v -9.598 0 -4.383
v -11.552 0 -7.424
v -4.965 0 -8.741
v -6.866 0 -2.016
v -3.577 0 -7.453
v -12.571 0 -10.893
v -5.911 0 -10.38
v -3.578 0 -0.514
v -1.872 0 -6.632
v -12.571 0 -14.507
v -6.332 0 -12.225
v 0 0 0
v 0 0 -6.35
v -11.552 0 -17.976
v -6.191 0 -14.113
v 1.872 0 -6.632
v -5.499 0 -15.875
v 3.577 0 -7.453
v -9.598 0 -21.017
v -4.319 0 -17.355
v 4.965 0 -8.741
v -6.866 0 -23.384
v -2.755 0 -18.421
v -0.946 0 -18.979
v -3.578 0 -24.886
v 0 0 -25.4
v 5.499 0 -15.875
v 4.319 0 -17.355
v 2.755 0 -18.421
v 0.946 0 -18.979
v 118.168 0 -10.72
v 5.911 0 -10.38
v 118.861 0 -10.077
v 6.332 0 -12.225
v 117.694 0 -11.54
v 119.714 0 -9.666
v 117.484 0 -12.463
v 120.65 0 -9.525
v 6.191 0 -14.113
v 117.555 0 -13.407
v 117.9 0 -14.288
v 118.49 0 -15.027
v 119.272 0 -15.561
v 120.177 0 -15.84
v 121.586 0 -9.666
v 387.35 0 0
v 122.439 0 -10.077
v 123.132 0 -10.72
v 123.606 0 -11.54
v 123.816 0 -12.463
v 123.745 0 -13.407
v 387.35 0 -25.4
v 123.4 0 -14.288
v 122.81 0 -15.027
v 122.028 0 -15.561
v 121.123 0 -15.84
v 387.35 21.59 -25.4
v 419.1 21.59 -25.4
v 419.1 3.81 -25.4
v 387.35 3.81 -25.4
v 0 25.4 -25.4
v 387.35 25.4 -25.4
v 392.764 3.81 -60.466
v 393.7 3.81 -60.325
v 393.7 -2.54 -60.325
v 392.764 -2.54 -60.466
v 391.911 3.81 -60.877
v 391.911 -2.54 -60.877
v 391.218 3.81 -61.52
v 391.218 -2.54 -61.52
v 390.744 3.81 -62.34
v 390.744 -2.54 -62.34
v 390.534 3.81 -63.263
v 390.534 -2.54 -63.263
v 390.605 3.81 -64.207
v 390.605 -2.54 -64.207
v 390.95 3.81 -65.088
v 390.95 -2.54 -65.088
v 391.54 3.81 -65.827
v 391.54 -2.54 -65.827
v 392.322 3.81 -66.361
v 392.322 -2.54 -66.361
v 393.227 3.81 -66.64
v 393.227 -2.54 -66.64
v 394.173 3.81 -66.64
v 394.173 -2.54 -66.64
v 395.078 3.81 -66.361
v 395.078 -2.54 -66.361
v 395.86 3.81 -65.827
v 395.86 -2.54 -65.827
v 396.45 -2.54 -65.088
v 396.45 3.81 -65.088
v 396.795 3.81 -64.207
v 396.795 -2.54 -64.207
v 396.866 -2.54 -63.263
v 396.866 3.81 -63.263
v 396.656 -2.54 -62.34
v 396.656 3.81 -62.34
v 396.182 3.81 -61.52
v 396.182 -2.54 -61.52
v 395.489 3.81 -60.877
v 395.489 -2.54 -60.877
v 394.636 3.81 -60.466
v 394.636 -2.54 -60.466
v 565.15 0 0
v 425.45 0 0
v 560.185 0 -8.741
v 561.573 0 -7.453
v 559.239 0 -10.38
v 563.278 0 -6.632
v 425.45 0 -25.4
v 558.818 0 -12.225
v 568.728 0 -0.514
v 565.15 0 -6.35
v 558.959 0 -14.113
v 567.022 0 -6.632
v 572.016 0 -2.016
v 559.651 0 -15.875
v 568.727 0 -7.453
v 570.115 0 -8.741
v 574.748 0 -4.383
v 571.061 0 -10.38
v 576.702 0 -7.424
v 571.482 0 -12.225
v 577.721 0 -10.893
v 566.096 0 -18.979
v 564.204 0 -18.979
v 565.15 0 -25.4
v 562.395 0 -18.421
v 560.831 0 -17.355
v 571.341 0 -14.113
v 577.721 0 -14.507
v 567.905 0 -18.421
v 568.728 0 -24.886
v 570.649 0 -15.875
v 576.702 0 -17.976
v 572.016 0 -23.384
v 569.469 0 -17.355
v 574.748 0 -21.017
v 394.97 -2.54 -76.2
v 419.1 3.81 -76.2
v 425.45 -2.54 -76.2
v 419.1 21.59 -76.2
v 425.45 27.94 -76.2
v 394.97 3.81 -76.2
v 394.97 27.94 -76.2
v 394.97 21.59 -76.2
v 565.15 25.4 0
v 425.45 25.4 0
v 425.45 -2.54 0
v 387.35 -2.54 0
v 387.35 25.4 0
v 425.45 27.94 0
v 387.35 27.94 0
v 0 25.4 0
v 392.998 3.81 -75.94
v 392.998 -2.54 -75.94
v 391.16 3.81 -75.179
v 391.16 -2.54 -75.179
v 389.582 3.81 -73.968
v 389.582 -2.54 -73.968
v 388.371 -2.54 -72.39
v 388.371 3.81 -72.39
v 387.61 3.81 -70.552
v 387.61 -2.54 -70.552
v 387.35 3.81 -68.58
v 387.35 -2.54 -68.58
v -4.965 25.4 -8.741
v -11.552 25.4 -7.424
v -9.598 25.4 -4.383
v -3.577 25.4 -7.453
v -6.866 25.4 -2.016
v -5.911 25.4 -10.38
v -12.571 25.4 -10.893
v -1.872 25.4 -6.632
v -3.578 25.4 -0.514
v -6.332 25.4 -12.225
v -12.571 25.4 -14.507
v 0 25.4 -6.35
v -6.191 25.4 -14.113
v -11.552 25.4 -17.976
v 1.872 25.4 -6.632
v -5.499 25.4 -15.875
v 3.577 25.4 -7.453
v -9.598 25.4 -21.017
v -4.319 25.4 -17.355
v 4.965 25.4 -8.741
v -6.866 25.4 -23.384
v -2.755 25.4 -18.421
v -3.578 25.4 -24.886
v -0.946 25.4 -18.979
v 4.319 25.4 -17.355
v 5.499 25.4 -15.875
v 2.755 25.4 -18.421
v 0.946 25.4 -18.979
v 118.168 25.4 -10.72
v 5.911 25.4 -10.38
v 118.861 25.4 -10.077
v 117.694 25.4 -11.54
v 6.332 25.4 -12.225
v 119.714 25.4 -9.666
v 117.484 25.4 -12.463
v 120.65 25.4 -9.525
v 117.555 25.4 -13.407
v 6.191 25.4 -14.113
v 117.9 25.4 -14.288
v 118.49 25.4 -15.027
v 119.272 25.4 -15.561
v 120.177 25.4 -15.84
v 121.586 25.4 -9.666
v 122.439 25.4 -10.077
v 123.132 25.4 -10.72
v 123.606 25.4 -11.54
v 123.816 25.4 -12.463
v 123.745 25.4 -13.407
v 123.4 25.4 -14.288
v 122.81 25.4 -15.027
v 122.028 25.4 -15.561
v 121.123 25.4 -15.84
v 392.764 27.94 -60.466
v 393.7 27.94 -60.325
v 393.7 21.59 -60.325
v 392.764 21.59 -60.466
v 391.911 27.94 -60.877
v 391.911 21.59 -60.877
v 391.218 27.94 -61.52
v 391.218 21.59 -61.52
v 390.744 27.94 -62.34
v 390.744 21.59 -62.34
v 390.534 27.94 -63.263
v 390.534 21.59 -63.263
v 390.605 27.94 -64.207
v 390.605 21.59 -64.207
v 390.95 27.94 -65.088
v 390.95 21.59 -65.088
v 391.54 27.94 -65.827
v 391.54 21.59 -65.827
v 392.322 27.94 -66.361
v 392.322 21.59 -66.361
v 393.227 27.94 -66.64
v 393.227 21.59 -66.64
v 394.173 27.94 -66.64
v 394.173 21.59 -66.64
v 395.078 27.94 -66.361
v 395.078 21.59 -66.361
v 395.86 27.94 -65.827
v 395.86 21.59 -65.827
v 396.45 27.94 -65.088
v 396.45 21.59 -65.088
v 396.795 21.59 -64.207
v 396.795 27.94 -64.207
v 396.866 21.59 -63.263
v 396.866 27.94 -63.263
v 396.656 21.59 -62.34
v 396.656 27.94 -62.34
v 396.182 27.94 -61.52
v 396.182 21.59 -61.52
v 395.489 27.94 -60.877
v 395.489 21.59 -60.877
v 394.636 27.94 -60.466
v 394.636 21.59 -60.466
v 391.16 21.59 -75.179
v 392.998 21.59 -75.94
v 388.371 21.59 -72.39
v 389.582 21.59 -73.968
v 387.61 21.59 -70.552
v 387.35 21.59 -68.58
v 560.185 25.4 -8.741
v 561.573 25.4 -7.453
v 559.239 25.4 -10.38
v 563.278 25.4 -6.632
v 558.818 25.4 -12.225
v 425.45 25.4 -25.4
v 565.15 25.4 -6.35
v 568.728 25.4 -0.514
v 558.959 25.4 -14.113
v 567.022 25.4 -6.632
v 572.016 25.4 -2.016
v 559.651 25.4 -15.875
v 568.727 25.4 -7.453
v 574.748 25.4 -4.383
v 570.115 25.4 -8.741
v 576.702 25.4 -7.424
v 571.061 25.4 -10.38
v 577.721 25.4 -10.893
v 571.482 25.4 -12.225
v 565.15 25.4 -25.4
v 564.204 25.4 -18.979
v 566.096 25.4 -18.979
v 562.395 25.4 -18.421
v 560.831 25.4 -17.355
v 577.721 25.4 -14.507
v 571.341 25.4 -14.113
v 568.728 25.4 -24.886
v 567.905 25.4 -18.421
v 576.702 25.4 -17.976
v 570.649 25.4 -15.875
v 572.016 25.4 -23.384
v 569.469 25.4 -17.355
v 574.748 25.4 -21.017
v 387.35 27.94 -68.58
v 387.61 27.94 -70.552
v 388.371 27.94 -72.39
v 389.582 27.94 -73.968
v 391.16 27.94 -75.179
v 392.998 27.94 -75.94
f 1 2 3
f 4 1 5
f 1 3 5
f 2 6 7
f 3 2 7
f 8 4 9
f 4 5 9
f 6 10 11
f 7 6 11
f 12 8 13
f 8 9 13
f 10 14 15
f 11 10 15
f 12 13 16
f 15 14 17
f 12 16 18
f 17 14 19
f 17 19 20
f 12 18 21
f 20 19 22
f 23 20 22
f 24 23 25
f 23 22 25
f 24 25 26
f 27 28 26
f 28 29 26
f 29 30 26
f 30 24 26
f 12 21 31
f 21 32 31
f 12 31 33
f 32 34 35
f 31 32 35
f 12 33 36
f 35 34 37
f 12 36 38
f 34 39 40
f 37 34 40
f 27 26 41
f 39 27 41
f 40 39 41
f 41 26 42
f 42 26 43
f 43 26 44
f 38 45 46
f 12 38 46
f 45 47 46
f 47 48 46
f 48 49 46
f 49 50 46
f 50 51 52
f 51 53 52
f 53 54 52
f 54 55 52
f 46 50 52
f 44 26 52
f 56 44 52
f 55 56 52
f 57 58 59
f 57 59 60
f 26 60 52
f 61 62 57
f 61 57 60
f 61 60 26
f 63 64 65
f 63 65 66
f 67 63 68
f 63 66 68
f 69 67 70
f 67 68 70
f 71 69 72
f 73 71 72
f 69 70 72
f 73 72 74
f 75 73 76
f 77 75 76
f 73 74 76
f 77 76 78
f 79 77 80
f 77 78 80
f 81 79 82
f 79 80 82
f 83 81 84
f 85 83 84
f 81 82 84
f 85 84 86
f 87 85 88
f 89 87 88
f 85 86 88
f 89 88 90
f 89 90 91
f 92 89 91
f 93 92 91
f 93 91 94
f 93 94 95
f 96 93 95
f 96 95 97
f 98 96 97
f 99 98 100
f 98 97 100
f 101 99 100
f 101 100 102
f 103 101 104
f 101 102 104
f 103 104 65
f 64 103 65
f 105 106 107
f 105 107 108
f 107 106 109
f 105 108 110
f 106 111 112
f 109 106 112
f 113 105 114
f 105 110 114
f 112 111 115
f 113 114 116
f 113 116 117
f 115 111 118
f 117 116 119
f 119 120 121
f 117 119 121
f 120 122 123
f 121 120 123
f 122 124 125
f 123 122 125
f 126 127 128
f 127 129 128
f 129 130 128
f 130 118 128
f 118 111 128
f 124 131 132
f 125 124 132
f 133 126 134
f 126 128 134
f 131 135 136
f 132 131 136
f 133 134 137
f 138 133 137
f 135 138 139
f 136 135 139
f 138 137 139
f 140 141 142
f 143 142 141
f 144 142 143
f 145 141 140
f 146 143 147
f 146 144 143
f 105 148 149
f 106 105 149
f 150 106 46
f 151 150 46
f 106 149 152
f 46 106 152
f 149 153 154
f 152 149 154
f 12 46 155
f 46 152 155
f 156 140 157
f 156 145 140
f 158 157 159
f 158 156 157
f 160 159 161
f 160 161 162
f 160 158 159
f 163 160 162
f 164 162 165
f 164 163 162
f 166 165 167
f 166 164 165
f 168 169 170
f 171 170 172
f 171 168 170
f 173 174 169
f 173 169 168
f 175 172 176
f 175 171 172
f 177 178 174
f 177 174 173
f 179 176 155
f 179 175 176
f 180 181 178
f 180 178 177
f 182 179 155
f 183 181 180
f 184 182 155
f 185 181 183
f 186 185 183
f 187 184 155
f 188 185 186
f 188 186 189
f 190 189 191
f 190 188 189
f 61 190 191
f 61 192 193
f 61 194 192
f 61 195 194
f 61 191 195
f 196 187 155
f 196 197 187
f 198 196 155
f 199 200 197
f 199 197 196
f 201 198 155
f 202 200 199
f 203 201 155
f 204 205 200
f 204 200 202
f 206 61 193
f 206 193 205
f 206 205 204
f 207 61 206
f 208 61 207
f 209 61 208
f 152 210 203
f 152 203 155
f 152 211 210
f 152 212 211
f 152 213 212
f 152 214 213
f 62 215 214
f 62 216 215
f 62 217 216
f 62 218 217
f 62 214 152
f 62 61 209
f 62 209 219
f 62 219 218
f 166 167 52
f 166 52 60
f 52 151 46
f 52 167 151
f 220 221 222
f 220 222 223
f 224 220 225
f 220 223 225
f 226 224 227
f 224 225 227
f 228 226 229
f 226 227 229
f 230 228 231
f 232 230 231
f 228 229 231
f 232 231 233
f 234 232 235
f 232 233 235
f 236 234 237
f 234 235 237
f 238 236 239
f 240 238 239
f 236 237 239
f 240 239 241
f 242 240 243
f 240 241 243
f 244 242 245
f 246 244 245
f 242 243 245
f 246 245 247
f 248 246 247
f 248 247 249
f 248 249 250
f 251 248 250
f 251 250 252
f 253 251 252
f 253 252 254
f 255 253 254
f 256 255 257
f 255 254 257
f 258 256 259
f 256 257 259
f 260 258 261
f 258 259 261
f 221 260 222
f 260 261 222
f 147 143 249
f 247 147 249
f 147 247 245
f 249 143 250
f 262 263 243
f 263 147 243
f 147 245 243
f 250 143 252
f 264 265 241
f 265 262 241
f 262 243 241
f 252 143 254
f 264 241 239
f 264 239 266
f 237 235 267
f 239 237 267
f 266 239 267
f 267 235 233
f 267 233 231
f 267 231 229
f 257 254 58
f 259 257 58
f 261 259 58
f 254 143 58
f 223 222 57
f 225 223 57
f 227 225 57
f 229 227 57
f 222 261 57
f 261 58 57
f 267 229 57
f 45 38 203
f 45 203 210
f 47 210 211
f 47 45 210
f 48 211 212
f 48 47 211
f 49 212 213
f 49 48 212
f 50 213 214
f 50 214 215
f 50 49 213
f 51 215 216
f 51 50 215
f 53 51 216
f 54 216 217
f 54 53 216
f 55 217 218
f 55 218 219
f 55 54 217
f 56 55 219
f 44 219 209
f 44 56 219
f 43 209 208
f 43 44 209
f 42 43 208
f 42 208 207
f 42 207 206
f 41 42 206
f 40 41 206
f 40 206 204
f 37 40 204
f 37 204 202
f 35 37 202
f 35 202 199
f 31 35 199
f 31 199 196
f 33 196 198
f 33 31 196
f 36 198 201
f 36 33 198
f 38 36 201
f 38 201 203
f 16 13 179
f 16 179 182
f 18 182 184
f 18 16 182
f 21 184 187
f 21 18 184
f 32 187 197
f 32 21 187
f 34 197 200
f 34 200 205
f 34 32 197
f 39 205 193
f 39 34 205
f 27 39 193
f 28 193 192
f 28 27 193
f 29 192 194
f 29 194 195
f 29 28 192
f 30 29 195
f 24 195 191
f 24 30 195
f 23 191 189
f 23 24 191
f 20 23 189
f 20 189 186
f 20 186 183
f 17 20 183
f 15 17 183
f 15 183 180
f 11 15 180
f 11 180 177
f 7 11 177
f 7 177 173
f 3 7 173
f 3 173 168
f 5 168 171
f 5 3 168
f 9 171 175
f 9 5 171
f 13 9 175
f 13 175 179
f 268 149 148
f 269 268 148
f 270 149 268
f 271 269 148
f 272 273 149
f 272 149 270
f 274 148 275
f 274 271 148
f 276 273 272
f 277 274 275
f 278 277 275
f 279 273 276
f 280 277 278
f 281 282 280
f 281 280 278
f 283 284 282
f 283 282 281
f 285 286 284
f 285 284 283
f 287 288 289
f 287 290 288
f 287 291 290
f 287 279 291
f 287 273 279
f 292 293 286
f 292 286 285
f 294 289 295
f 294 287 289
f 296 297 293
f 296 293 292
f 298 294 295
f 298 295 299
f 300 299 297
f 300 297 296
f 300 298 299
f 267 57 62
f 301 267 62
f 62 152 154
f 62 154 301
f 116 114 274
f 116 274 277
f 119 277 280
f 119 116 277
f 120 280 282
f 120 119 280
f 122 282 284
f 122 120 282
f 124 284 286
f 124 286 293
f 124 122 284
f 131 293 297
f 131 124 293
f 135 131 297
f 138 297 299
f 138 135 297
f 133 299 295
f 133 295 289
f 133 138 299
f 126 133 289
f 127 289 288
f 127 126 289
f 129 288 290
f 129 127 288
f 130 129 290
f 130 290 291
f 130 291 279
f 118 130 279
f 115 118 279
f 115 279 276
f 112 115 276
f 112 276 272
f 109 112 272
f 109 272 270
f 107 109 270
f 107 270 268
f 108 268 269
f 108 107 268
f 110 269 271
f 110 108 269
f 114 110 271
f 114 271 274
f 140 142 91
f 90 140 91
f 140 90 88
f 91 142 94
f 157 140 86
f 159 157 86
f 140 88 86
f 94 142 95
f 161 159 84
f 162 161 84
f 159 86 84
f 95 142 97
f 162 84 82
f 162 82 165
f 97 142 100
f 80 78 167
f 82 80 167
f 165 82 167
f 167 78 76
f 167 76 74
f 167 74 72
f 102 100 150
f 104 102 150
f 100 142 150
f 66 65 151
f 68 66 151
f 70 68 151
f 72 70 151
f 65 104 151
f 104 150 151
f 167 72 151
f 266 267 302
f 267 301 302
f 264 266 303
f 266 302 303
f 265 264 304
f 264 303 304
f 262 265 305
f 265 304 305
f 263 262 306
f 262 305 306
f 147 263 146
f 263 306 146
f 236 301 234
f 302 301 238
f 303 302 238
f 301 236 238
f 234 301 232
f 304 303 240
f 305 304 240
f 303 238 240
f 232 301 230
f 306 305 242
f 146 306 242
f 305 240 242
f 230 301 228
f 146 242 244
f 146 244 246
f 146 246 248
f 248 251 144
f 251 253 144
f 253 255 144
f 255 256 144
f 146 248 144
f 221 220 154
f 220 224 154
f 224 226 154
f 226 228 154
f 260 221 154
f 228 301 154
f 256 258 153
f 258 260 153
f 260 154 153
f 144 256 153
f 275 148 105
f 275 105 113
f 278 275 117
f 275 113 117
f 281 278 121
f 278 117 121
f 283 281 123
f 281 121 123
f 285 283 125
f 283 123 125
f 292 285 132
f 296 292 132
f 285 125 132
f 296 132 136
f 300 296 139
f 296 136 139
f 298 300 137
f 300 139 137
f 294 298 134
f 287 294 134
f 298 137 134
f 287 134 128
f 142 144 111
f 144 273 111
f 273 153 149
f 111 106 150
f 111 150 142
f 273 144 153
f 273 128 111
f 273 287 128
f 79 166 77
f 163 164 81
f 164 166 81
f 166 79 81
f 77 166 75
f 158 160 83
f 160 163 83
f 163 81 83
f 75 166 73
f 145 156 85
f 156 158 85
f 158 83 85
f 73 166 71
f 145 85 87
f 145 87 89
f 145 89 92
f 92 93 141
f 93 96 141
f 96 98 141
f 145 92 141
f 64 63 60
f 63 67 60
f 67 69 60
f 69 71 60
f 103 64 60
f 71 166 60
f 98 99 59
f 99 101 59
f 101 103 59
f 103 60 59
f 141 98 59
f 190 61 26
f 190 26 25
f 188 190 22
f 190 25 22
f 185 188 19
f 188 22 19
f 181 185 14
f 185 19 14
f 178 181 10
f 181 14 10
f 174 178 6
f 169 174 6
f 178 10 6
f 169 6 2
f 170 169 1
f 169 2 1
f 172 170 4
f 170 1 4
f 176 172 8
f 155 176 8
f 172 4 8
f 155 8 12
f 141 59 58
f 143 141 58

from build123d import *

# Parameters (mm, degrees)
SKETCH2_R           = 6.35
SKETCH2_R_2         = 3.175
BOSS_EXTRUDE1_DEPTH = 25.4
SKETCH12_W          = 38.1
SKETCH12_H          = 25.4
SKETCH12_H_2        = 2.54
BOSS_EXTRUDE2_DEPTH = 25.4
BOSS_EXTRUDE3_DEPTH = 50.8
SKETCH14_R          = 3.175
CUT_EXTRUDE1_DEPTH  = 39.624
FILLET1_R           = 7.62


with BuildPart() as part:
    # Sketch2 → Boss-Extrude1 (new body)
    with BuildSketch(Plane(origin=(0, 0, 0), x_dir=(1, 0, 0), z_dir=(0, 1, 0))):
        with BuildLine():
            ThreePointArc((0, 25.4), (-12.7, 12.7), (0, 0))
            Line((0, 0), (565.15, 0))
            ThreePointArc((565.15, 0), (577.85, 12.7), (565.15, 25.4))
            Line((565.15, 25.4), (0, 25.4))
        make_face()
        with Locations(Location((0, 12.7, 0), (0, 0, 270))):
            Circle(SKETCH2_R, mode=Mode.SUBTRACT)
        with Locations(Location((120.65, 12.7, 0), (0, 0, 270))):
            Circle(SKETCH2_R_2, mode=Mode.SUBTRACT)
        with Locations(Location((565.15, 12.7, 0), (0, 0, 270))):
            Circle(SKETCH2_R, mode=Mode.SUBTRACT)
    extrude(amount=BOSS_EXTRUDE1_DEPTH)

    # Sketch12 → Boss-Extrude2 (add)
    with BuildSketch(Plane(origin=(0, 0, -25.4), x_dir=(-1, 0, 0), z_dir=(0, 0, -1))):
        with Locations((-406.4, 12.7)):
            Rectangle(SKETCH12_W, SKETCH12_H)
        with Locations((-406.4, -1.27)):
            Rectangle(SKETCH12_W, SKETCH12_H_2)
        with Locations((-406.4, 26.67)):
            Rectangle(SKETCH12_W, SKETCH12_H_2)
    extrude(amount=-BOSS_EXTRUDE2_DEPTH)

    # Sketch13 → Boss-Extrude3 (add)
    with BuildSketch(Plane(origin=(0, 0, -25.4), x_dir=(-1, 0, 0), z_dir=(0, 0, -1))):
        Polygon((-387.35, 27.94), (-425.45, 27.94), (-425.45, 25.4), (-425.45, 0), (-425.45, -2.54), (-387.35, -2.54), (-387.35, 0), (-387.35, 3.81), (-419.1, 3.81), (-419.1, 21.59), (-387.35, 21.59), (-387.35, 25.4), align=None)
    extrude(amount=BOSS_EXTRUDE3_DEPTH)

    # Sketch14 → Cut-Extrude1 (cut, symmetric)
    with BuildSketch(Plane.XZ.offset(-21.59)):
        with Locations(Location((393.7, -63.5, 0), (0, 0, 90))):
            Circle(SKETCH14_R)
    extrude(amount=CUT_EXTRUDE1_DEPTH, both=True, mode=Mode.SUBTRACT)

    # Fillet1
    fillet1_edges = [part.edges().sort_by_distance(p)[0] for p in [
        (387.35, 24.765, -76.2),
        (387.35, 0.635, -76.2),
    ]]
    fillet(fillet1_edges, radius=FILLET1_R)


solid = part.part
